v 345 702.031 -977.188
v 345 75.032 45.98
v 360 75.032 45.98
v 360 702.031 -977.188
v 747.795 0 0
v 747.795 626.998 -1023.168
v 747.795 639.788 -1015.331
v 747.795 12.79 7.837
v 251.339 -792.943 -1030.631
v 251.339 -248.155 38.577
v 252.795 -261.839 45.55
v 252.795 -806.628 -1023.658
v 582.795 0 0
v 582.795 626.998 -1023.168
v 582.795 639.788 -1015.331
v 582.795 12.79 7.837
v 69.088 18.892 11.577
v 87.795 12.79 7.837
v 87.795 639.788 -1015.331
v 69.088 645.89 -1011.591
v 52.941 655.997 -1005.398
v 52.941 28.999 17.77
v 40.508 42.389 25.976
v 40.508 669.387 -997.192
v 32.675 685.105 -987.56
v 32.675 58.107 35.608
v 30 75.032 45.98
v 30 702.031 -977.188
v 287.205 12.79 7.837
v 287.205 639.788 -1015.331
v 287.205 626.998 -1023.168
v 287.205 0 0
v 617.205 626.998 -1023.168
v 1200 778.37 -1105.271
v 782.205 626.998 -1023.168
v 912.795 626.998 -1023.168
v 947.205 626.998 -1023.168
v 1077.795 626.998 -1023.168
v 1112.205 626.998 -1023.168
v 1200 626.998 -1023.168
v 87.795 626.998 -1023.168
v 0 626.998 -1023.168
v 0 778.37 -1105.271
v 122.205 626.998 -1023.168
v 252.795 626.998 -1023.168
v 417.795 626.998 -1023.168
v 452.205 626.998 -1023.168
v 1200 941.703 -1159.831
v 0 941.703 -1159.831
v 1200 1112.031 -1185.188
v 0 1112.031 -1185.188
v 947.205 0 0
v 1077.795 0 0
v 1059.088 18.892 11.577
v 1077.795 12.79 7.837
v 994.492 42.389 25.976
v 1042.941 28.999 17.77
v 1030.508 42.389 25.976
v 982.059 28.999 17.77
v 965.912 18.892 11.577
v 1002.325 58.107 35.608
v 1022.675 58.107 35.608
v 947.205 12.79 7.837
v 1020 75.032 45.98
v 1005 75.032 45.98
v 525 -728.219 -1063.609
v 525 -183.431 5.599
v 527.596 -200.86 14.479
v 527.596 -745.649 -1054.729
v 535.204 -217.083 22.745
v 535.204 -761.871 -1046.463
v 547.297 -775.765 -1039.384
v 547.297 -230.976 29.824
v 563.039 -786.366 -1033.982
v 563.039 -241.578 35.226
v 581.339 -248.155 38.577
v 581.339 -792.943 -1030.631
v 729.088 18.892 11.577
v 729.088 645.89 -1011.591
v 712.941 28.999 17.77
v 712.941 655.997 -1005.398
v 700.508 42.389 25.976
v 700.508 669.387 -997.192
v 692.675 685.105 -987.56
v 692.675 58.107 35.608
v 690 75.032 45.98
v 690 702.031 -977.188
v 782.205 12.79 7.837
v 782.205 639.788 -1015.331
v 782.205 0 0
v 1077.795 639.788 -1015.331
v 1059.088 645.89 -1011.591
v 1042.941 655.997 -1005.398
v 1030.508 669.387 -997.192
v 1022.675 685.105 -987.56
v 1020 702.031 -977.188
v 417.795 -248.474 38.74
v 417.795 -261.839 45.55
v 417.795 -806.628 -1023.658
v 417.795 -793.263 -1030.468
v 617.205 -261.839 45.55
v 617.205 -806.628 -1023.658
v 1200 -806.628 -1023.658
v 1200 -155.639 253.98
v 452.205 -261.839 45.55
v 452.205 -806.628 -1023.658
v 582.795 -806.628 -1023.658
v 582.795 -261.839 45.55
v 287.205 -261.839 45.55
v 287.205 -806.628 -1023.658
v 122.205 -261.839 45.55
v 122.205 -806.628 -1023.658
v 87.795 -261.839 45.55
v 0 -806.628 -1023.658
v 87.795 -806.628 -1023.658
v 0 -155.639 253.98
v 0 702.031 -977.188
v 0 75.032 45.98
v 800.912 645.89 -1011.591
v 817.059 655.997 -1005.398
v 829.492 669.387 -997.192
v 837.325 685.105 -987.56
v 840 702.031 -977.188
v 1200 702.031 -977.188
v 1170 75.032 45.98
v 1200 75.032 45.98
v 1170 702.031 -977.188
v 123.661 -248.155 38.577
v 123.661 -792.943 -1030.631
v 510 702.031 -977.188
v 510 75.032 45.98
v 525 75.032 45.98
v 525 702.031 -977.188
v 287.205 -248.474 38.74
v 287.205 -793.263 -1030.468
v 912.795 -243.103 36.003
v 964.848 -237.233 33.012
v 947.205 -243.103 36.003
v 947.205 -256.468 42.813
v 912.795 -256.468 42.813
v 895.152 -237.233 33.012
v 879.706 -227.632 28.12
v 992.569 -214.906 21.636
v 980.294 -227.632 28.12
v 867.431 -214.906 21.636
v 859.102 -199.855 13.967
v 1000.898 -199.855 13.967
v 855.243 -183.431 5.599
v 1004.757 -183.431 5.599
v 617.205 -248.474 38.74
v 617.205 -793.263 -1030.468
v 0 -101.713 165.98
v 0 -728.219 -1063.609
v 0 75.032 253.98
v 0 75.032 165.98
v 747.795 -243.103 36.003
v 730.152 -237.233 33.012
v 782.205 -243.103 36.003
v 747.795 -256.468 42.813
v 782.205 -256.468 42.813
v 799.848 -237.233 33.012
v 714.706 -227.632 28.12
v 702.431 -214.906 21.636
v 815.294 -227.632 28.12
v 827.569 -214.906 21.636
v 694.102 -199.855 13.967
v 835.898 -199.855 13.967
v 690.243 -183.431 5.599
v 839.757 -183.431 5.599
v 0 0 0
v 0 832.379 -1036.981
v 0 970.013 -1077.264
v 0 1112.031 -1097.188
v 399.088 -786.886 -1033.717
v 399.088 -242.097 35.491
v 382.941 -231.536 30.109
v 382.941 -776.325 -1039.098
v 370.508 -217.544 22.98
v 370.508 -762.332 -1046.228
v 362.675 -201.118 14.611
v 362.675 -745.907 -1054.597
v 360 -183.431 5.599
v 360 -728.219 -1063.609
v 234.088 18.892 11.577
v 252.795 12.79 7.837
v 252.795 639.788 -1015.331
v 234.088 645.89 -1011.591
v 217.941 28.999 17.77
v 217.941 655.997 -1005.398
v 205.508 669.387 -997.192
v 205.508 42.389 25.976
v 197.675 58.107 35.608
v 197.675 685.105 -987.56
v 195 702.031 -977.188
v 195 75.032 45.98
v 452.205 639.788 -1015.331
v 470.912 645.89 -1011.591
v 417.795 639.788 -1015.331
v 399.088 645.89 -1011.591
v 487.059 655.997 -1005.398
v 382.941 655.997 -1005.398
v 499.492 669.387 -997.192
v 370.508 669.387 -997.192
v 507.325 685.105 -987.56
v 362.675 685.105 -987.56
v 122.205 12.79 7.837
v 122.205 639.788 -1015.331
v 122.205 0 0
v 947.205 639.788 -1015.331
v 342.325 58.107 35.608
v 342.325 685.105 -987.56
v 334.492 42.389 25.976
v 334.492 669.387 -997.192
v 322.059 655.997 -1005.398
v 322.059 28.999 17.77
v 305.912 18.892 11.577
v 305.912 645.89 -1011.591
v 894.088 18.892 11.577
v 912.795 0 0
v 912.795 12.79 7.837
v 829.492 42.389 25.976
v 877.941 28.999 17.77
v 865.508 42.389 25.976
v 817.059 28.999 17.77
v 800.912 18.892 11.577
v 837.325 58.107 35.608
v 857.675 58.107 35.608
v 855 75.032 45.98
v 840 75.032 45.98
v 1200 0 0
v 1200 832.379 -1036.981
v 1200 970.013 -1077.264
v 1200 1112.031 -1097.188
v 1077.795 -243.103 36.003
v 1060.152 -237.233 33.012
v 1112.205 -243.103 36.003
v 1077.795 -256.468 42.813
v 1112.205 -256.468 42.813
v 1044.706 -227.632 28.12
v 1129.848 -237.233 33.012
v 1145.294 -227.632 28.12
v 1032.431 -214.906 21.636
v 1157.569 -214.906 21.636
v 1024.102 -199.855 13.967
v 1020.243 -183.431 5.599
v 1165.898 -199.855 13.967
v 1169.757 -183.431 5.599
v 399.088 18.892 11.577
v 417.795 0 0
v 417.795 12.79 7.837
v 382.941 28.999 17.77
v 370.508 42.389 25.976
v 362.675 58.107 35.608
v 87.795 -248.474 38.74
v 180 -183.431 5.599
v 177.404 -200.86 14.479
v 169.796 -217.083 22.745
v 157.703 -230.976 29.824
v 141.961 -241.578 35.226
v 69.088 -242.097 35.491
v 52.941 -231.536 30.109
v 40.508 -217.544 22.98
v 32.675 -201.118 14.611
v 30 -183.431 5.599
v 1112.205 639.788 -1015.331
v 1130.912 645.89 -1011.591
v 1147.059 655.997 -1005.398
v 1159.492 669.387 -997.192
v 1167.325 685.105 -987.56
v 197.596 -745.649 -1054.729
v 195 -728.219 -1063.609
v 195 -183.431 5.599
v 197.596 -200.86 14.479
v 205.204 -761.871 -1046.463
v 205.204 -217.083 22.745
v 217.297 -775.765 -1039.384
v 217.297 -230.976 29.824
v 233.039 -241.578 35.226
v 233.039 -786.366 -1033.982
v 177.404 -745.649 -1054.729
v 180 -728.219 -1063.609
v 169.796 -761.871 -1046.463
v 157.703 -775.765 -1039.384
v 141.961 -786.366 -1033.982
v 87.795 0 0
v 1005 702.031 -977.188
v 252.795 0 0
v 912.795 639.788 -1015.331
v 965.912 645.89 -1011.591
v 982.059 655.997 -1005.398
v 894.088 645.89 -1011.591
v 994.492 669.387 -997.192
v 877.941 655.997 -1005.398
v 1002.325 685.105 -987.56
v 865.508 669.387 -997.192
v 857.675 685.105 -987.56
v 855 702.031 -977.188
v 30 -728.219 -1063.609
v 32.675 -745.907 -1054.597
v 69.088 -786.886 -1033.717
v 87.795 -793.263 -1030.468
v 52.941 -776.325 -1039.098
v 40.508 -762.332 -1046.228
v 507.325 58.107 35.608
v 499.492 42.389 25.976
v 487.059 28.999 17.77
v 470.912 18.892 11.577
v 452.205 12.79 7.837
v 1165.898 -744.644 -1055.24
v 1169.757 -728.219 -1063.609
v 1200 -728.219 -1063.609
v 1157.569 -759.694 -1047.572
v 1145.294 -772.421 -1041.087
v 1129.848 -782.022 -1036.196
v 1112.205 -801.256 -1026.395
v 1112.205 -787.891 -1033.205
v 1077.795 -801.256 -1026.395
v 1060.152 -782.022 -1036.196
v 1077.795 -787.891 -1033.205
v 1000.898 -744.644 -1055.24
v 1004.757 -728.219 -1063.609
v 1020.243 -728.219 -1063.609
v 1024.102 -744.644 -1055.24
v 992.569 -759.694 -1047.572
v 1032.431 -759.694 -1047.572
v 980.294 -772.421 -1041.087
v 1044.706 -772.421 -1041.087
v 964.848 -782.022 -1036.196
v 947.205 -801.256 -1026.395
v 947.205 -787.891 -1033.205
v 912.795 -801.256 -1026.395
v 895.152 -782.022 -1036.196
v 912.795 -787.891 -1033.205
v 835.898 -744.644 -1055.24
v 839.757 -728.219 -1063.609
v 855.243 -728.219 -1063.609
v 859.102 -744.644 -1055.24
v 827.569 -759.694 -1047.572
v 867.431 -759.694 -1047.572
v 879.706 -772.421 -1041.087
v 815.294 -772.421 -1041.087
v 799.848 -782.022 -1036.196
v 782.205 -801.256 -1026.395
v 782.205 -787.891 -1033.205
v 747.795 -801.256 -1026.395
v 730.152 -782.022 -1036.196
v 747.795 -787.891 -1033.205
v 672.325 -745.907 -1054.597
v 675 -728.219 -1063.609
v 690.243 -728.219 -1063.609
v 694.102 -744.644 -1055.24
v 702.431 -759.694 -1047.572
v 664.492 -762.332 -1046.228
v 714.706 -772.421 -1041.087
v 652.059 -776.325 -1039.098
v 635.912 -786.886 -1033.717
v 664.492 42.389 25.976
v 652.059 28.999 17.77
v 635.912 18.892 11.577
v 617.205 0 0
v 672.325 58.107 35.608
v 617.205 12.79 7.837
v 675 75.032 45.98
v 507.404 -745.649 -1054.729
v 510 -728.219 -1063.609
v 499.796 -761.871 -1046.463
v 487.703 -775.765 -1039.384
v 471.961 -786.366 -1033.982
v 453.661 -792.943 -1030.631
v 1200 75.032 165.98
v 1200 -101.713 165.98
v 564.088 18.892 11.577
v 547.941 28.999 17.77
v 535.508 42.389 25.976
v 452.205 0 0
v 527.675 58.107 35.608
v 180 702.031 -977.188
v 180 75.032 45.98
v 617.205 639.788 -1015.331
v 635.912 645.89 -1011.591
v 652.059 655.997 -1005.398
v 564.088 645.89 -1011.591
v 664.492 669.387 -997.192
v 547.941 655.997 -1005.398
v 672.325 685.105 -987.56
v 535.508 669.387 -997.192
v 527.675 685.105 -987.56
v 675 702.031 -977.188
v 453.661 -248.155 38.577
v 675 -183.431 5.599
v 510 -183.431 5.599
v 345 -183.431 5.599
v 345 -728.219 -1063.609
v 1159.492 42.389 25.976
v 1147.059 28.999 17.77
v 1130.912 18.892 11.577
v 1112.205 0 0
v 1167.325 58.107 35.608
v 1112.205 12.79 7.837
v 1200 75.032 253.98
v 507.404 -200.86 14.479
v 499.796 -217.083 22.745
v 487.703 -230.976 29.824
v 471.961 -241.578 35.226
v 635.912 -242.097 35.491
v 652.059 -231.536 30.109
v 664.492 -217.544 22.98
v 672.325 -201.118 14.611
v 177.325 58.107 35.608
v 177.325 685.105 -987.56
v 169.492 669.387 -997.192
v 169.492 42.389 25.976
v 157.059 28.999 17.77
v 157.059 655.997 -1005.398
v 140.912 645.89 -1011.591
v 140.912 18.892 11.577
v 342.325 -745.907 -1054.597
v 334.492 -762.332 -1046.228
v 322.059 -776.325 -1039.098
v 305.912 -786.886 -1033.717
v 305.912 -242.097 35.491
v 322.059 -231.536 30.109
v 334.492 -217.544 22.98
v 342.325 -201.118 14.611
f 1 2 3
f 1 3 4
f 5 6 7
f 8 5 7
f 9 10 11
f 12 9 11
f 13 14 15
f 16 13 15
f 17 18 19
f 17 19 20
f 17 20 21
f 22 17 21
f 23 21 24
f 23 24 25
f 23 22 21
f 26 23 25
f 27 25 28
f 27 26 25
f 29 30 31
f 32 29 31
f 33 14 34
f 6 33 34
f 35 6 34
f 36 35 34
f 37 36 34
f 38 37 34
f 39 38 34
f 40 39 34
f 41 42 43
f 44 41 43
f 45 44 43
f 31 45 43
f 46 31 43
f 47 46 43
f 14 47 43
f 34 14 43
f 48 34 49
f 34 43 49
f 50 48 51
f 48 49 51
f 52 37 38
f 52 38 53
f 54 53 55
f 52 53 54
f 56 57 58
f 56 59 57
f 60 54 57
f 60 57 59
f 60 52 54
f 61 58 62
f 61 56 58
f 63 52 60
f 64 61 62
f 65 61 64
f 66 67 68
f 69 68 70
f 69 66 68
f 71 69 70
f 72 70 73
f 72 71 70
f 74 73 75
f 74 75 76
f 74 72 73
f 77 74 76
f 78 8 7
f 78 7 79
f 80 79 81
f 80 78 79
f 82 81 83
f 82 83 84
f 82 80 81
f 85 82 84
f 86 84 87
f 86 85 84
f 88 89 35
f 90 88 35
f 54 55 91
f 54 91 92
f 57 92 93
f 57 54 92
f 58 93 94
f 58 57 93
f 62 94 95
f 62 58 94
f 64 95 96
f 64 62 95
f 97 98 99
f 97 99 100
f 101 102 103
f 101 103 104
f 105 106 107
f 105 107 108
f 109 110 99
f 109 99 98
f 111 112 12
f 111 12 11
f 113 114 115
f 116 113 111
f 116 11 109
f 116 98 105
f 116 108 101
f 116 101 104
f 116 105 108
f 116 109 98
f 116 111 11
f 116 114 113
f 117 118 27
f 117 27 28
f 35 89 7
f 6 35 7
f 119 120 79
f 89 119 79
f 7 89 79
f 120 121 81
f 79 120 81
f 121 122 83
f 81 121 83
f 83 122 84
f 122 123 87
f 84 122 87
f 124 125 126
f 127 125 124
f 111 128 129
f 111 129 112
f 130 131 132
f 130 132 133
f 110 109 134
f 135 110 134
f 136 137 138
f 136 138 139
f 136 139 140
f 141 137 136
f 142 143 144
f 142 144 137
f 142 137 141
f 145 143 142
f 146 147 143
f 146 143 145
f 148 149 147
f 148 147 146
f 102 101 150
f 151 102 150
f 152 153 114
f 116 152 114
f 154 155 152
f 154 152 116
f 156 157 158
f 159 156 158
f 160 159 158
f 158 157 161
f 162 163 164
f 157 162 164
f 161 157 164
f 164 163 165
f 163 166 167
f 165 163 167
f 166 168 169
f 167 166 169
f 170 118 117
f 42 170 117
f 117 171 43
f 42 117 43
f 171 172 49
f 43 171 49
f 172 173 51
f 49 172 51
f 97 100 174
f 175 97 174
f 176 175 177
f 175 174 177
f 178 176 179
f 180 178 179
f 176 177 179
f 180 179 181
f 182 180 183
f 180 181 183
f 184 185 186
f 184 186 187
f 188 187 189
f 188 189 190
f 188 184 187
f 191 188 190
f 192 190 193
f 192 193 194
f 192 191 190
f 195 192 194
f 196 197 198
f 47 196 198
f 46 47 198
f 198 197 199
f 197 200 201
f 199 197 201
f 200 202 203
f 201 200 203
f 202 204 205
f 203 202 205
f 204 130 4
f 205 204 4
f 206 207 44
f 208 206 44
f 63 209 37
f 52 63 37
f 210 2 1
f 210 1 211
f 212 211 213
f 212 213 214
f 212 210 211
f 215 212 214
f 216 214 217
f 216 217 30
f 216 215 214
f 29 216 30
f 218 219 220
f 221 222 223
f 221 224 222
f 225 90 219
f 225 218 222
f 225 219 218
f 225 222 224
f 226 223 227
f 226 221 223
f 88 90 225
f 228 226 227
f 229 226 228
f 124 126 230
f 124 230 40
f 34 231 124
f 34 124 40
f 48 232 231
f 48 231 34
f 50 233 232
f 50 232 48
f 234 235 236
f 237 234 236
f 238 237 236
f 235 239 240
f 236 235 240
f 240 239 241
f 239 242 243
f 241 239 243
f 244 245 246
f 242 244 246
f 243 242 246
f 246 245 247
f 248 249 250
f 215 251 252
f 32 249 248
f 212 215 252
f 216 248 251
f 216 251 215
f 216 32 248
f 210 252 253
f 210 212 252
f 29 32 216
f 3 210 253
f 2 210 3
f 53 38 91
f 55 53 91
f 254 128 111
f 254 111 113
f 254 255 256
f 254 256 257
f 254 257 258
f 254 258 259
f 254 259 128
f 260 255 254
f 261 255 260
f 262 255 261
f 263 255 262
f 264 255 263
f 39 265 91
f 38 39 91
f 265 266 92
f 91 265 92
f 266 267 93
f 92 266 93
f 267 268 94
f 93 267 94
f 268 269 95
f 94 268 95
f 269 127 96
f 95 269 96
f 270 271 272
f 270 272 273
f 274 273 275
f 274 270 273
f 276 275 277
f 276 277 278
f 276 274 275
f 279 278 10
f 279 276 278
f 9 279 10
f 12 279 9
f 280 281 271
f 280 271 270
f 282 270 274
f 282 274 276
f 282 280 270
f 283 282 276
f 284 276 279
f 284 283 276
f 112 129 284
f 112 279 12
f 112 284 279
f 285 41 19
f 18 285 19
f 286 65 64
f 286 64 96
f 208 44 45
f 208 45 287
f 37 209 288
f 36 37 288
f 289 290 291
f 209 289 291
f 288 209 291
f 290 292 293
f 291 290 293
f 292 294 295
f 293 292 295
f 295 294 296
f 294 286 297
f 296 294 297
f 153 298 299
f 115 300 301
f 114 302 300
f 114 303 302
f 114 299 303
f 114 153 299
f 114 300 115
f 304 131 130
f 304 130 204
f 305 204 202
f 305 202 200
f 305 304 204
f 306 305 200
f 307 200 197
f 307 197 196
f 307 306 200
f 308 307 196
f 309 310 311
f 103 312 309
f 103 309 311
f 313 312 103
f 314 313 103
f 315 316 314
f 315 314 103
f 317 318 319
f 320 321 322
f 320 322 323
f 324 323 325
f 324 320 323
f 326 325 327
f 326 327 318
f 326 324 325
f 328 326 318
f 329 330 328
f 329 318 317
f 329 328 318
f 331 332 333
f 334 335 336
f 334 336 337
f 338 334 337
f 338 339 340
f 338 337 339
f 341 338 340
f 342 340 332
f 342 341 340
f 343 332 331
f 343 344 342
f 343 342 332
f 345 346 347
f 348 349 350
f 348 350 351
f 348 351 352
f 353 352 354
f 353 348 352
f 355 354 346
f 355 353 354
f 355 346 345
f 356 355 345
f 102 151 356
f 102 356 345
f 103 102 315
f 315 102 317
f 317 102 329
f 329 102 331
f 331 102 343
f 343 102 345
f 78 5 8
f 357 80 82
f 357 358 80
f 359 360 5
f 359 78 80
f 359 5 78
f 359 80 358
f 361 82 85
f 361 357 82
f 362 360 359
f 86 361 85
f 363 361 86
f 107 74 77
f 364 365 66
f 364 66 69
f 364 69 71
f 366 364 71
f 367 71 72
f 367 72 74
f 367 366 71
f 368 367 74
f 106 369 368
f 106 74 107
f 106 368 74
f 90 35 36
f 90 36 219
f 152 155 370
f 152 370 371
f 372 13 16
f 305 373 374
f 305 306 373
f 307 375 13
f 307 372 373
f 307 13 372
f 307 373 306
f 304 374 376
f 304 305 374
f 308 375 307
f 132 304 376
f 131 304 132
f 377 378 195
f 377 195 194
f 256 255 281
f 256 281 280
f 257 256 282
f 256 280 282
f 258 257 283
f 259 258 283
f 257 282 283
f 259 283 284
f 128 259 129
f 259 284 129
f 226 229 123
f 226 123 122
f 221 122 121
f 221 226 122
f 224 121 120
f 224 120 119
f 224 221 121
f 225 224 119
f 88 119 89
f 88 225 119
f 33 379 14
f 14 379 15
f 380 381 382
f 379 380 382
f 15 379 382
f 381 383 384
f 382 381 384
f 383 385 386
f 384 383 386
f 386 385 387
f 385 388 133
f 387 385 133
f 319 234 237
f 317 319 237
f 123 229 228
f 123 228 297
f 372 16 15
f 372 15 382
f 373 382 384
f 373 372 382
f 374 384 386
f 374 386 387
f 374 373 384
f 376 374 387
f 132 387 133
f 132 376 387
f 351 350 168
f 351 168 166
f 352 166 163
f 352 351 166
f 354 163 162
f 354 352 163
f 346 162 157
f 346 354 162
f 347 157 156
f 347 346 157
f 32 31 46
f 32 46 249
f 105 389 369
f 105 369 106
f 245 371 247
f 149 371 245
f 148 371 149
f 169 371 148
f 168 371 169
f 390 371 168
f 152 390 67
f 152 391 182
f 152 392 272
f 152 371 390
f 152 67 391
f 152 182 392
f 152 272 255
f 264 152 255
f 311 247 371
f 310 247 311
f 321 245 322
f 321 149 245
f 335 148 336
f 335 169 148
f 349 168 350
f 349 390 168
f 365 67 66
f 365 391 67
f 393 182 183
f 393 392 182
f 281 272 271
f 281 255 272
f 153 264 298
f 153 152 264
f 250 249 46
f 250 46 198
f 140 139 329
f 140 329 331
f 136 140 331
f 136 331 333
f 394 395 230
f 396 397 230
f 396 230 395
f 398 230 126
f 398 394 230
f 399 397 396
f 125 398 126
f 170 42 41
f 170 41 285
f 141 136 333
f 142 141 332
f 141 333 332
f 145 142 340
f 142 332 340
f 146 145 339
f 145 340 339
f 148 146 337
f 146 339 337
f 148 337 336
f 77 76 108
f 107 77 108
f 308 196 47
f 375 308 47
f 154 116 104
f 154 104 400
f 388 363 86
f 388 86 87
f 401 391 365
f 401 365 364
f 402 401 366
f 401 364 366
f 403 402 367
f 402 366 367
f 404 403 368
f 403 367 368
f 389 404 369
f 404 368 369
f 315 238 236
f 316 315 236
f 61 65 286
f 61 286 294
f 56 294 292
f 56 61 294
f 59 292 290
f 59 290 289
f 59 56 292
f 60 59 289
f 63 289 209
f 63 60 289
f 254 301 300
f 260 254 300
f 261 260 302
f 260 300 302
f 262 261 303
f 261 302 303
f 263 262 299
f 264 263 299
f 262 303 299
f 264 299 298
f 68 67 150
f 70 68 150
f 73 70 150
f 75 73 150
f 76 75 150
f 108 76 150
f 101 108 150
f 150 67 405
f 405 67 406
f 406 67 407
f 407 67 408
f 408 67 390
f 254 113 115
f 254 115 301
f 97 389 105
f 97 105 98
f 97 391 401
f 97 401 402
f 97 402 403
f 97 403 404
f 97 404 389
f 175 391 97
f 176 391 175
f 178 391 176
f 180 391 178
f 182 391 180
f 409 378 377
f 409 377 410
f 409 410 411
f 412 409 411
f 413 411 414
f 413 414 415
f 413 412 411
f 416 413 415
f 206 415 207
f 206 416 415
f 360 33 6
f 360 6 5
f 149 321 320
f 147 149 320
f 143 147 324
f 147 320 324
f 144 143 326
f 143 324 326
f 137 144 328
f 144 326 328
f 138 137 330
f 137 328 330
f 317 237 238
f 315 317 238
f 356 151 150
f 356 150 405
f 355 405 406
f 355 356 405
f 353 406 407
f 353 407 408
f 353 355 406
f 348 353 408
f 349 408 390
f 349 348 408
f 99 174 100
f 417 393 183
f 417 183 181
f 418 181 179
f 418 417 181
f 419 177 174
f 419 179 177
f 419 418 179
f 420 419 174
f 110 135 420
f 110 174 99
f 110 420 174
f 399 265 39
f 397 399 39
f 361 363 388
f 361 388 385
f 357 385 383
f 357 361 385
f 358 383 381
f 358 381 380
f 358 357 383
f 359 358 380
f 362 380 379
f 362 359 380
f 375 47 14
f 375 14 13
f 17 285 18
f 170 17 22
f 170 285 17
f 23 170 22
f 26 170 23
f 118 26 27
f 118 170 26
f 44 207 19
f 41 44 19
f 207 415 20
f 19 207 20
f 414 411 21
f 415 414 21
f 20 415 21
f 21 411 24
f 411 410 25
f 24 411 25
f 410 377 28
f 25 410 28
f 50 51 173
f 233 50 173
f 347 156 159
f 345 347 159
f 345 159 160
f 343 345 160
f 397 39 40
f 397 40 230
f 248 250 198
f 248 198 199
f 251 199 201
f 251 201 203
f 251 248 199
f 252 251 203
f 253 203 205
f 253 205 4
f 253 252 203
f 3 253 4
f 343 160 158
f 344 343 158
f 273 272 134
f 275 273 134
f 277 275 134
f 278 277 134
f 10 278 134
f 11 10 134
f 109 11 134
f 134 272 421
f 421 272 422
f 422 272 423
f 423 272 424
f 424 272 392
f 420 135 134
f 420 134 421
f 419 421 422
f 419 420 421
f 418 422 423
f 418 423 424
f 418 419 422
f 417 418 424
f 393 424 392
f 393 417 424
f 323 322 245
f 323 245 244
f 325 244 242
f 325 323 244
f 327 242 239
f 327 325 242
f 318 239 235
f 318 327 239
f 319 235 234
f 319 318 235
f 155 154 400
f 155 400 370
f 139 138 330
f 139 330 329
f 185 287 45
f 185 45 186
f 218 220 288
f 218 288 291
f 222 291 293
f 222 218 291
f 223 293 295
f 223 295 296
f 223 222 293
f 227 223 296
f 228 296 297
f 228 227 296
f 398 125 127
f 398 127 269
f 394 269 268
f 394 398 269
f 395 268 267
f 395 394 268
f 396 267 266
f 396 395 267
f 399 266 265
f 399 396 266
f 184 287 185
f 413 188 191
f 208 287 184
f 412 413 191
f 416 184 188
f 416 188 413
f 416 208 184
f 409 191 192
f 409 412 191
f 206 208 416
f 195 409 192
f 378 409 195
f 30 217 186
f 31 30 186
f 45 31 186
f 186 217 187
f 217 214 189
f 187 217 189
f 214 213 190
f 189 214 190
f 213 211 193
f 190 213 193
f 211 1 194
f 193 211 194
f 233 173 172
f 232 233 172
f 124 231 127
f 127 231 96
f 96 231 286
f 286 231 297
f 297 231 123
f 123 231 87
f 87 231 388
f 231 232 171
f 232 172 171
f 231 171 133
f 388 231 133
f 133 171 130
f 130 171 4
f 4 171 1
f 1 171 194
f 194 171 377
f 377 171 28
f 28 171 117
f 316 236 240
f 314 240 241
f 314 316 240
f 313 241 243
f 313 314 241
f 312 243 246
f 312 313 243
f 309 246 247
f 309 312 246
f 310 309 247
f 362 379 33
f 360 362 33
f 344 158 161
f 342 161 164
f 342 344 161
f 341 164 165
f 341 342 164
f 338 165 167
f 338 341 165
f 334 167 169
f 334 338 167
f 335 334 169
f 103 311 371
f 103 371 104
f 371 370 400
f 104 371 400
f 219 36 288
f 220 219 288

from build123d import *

# Parameters (mm, degrees)
BOSS_EXTRUDE1_DEPTH = 1200
CUT_EXTRUDE1_DEPTH  = 1200
CUT_EXTRUDE2_DEPTH  = 1200


with BuildPart() as part:
    # Sketch1 → Boss-Extrude1 (new body)
    with BuildSketch(Plane(origin=(0, 0, 0), x_dir=(0, 0, -1), z_dir=(1, 0, 0))):
        with BuildLine():
            Line((977.18832353, 702.030612122), (1023.168197225, 626.998277659))
            ThreePointArc((1023.168197225, 626.998277659), (1136.117936637, 858.845320352), (1185.18832353, 1112.030612122))
            Line((1185.18832353, 1112.030612122), (1097.18832353, 1112.030612122))
            ThreePointArc((1097.18832353, 1112.030612122), (1059.623838022, 900.464120076), (977.18832353, 702.030612122))
        make_face()
        Polygon((977.18832353, 702.030612122), (1023.168197225, 626.998277659), (0, 0), (-45.979873695, 75.032334463), align=None)
        Polygon((1063.609129685, -728.219487056), (1023.657965708, -806.628061185), (-253.979873695, -155.639066772), (-253.979873695, 75.032334463), (-165.979873695, 75.032334463), (-165.979873695, -101.712597416), align=None)
    extrude(amount=BOSS_EXTRUDE1_DEPTH)

    # Sketch3 → Cut-Extrude1 (cut)
    with BuildSketch(Plane(origin=(0, 0, 0), x_dir=(1, 0, 0), z_dir=(0, -0.5224985647159087, 0.8526401643541169))):
        with BuildLine():
            Line((30, 88), (180, 88))
            ThreePointArc((180, 88), (163.801993121, 41.445455593), (122.204650534, 15))
            Line((122.204650534, 15), (122.204650534, 0))
            Line((122.204650534, 0), (87.795349466, 0))
            Line((87.795349466, 0), (87.795349466, 15))
            ThreePointArc((87.795349466, 15), (46.198006879, 41.445455593), (30, 88))
        make_face()
        with BuildLine():
            ThreePointArc((252.795349466, 15), (211.198006879, 41.445455593), (195, 88))
            Line((195, 88), (345, 88))
            ThreePointArc((345, 88), (328.801993121, 41.445455593), (287.204650534, 15))
            Line((287.204650534, 15), (287.204650534, 0))
            Line((287.204650534, 0), (252.795349466, 0))
            Line((252.795349466, 0), (252.795349466, 15))
        make_face()
        with BuildLine():
            Line((360, 88), (510, 88))
            ThreePointArc((510, 88), (493.801993121, 41.445455593), (452.204650534, 15))
            Line((452.204650534, 15), (452.204650534, 0))
            Line((452.204650534, 0), (417.795349466, 0))
            Line((417.795349466, 0), (417.795349466, 15))
            ThreePointArc((417.795349466, 15), (376.198006879, 41.445455593), (360, 88))
        make_face()
        with BuildLine():
            Line((617.204650534, 15), (617.204650534, 0))
            Line((617.204650534, 0), (582.795349466, 0))
            Line((582.795349466, 0), (582.795349466, 15))
            ThreePointArc((582.795349466, 15), (541.198006879, 41.445455593), (525, 88))
            Line((525, 88), (675, 88))
            ThreePointArc((675, 88), (658.801993121, 41.445455593), (617.204650534, 15))
        make_face()
        with BuildLine():
            ThreePointArc((747.795349466, 15), (706.198006879, 41.445455593), (690, 88))
            Line((690, 88), (840, 88))
            ThreePointArc((840, 88), (823.801993121, 41.445455593), (782.204650534, 15))
            Line((782.204650534, 15), (782.204650534, 0))
            Line((782.204650534, 0), (747.795349466, 0))
            Line((747.795349466, 0), (747.795349466, 15))
        make_face()
        with BuildLine():
            Line((855, 88), (1005, 88))
            ThreePointArc((1005, 88), (988.801993121, 41.445455593), (947.204650534, 15))
            Line((947.204650534, 15), (947.204650534, 0))
            Line((947.204650534, 0), (912.795349466, 0))
            Line((912.795349466, 0), (912.795349466, 15))
            ThreePointArc((912.795349466, 15), (871.198006879, 41.445455593), (855, 88))
        make_face()
        with BuildLine():
            ThreePointArc((1077.795349466, 15), (1036.198006879, 41.445455593), (1020, 88))
            Line((1020, 88), (1170, 88))
            ThreePointArc((1170, 88), (1153.801993121, 41.445455593), (1112.204650534, 15))
            Line((1112.204650534, 15), (1112.204650534, 0))
            Line((1112.204650534, 0), (1077.795349466, 0))
            Line((1077.795349466, 0), (1077.795349466, 15))
        make_face()
    extrude(amount=-CUT_EXTRUDE1_DEPTH, mode=Mode.SUBTRACT)

    # Sketch4 → Cut-Extrude2 (cut)
    with BuildSketch(Plane(origin=(0, -580.33033671, -1138.96241549), x_dir=(-1, 0, 0), z_dir=(0, -0.45399049973954275, -0.89100652418837))):
        with BuildLine():
            Line((-675, -165.979873695), (-525, -165.979873695))
            ThreePointArc((-525, -165.979873695), (-540.735365265, -211.944023527), (-581.338748527, -238.62116838))
            Line((-581.338748527, -238.62116838), (-582.795349466, -253.979873695))
            Line((-582.795349466, -253.979873695), (-617.204650534, -253.979873695))
            Line((-617.204650534, -253.979873695), (-617.204650534, -238.979873695))
            ThreePointArc((-617.204650534, -238.979873695), (-658.801993121, -212.534418102), (-675, -165.979873695))
        make_face()
        with BuildLine():
            Line((-453.661251473, -238.62116838), (-452.204650534, -253.979873695))
            Line((-452.204650534, -253.979873695), (-417.795349466, -253.979873695))
            Line((-417.795349466, -253.979873695), (-417.795349466, -238.979873695))
            ThreePointArc((-417.795349466, -238.979873695), (-376.198006879, -212.534418102), (-360, -165.979873695))
            Line((-360, -165.979873695), (-510, -165.979873695))
            ThreePointArc((-510, -165.979873695), (-494.264634735, -211.944023527), (-453.661251473, -238.62116838))
        make_face()
        with BuildLine():
            Line((-345, -165.979873695), (-195, -165.979873695))
            ThreePointArc((-195, -165.979873695), (-210.735365265, -211.944023527), (-251.338748527, -238.62116838))
            Line((-251.338748527, -238.62116838), (-252.795349466, -253.979873695))
            Line((-252.795349466, -253.979873695), (-287.204650534, -253.979873695))
            Line((-287.204650534, -253.979873695), (-287.204650534, -238.979873695))
            ThreePointArc((-287.204650534, -238.979873695), (-328.801993121, -212.534418102), (-345, -165.979873695))
        make_face()
        with BuildLine():
            Line((-123.661251473, -238.62116838), (-122.204650534, -253.979873695))
            Line((-122.204650534, -253.979873695), (-87.795349466, -253.979873695))
            Line((-87.795349466, -253.979873695), (-87.795349466, -238.979873695))
            ThreePointArc((-87.795349466, -238.979873695), (-46.198006879, -212.534418102), (-30, -165.979873695))
            Line((-30, -165.979873695), (-180, -165.979873695))
            ThreePointArc((-180, -165.979873695), (-164.264634735, -211.944023527), (-123.661251473, -238.62116838))
        make_face()
        with BuildLine():
            Line((-1170, -159.951163977), (-1020, -159.951163977))
            ThreePointArc((-1020, -159.951163977), (-1036.198006879, -206.505708384), (-1077.795349466, -232.951163977))
            Line((-1077.795349466, -232.951163977), (-1077.795349466, -247.951163977))
            Line((-1077.795349466, -247.951163977), (-1112.204650534, -247.951163977))
            Line((-1112.204650534, -247.951163977), (-1112.204650534, -232.951163977))
            ThreePointArc((-1112.204650534, -232.951163977), (-1153.801993121, -206.505708384), (-1170, -159.951163977))
        make_face()
        with BuildLine():
            Line((-947.204650534, -232.951163977), (-947.204650534, -247.951163977))
            Line((-947.204650534, -247.951163977), (-912.795349466, -247.951163977))
            Line((-912.795349466, -247.951163977), (-912.795349466, -232.951163977))
            ThreePointArc((-912.795349466, -232.951163977), (-871.198006879, -206.505708384), (-855, -159.951163977))
            Line((-855, -159.951163977), (-1005, -159.951163977))
            ThreePointArc((-1005, -159.951163977), (-988.801993121, -206.505708384), (-947.204650534, -232.951163977))
        make_face()
        with BuildLine():
            Line((-840, -159.951163977), (-690, -159.951163977))
            ThreePointArc((-690, -159.951163977), (-706.198006879, -206.505708384), (-747.795349466, -232.951163977))
            Line((-747.795349466, -232.951163977), (-747.795349466, -247.951163977))
            Line((-747.795349466, -247.951163977), (-782.204650534, -247.951163977))
            Line((-782.204650534, -247.951163977), (-782.204650534, -232.951163977))
            ThreePointArc((-782.204650534, -232.951163977), (-823.801993121, -206.505708384), (-840, -159.951163977))
        make_face()
    extrude(amount=-CUT_EXTRUDE2_DEPTH, mode=Mode.SUBTRACT)


solid = part.part
